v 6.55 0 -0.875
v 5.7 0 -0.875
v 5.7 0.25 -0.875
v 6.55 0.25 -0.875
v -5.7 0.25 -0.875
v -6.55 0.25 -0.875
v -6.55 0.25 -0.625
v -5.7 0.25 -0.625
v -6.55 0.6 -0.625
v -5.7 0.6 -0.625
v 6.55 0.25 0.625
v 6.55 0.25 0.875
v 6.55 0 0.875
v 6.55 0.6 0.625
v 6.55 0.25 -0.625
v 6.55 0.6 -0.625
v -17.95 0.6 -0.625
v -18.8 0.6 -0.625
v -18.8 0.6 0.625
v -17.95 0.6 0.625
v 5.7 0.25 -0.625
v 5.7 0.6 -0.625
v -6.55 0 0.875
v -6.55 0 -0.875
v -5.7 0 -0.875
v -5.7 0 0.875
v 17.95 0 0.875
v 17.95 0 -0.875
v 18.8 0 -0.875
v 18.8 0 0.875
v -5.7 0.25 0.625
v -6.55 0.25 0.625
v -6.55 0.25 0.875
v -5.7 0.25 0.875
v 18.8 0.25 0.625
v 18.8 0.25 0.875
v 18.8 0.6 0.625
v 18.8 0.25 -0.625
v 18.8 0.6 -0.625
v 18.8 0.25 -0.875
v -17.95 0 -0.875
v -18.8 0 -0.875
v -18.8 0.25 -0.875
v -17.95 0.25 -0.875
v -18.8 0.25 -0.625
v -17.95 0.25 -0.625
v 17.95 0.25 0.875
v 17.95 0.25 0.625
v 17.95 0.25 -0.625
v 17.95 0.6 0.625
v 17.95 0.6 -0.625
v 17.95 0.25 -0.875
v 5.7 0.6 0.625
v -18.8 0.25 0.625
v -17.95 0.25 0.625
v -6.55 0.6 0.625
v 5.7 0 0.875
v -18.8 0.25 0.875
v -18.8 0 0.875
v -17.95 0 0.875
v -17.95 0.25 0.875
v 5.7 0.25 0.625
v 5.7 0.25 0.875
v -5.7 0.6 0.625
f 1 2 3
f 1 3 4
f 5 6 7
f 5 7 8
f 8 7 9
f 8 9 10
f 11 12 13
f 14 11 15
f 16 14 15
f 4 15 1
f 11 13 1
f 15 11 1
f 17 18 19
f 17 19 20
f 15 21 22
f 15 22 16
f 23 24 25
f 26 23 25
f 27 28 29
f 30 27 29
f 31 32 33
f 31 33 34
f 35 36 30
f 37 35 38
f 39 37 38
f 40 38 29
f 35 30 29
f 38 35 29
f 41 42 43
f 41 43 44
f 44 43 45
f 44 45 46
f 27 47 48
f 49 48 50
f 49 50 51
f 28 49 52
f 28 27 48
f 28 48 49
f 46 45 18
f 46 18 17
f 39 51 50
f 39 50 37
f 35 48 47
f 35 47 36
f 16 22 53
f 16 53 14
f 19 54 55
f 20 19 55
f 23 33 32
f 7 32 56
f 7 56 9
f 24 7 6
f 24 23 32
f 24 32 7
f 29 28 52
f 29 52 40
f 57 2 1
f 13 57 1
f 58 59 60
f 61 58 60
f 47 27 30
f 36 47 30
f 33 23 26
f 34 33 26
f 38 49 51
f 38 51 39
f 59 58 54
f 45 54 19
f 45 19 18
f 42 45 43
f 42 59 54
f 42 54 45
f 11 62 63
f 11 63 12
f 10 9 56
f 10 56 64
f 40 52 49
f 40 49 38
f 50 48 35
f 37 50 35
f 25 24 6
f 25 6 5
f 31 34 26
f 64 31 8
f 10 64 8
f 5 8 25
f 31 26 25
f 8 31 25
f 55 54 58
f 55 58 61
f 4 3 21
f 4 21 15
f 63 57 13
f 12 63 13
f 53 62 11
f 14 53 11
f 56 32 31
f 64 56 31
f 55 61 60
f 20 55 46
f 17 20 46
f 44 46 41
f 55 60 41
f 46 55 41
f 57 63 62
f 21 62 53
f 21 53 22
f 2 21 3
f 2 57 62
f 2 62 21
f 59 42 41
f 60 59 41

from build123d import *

# Parameters (mm, degrees)
SKETCH1_W             = 0.85
SKETCH1_H             = 1.25
BOSS_EXTRUDE1_DEPTH   = 0.6
BOSS_EXTRUDE1_2_DEPTH = 0.6
BOSS_EXTRUDE1_3_DEPTH = 0.6
BOSS_EXTRUDE1_4_DEPTH = 0.6
SKETCH2_W             = 0.85
SKETCH2_H             = 0.25
BOSS_EXTRUDE2_DEPTH   = 0.25


with BuildPart() as part:
    # Sketch1 → Boss-Extrude1 (new body)
    with BuildSketch(Plane(origin=(0, 0, 0), x_dir=(1, 0, 0), z_dir=(0, 1, 0))):
        with Locations((-18.375, 0)):
            Rectangle(SKETCH1_W, SKETCH1_H)
    extrude(amount=BOSS_EXTRUDE1_DEPTH)



with BuildPart() as body_2:
    # Sketch1 → Boss-Extrude1 2 (new body)
    with BuildSketch(Plane(origin=(0, 0, 0), x_dir=(1, 0, 0), z_dir=(0, 1, 0))):
        with Locations((18.375, 0)):
            Rectangle(SKETCH1_W, SKETCH1_H)
    extrude(amount=BOSS_EXTRUDE1_2_DEPTH)


with BuildPart() as body_3:
    # Sketch1 → Boss-Extrude1 3 (new body)
    with BuildSketch(Plane(origin=(0, 0, 0), x_dir=(1, 0, 0), z_dir=(0, 1, 0))):
        with Locations((-6.125, 0)):
            Rectangle(SKETCH1_W, SKETCH1_H)
    extrude(amount=BOSS_EXTRUDE1_3_DEPTH)


with BuildPart() as body_4:
    # Sketch1 → Boss-Extrude1 4 (new body)
    with BuildSketch(Plane(origin=(0, 0, 0), x_dir=(1, 0, 0), z_dir=(0, 1, 0))):
        with Locations((6.125, 0)):
            Rectangle(SKETCH1_W, SKETCH1_H)
    extrude(amount=BOSS_EXTRUDE1_4_DEPTH)


with BuildPart() as part_1:
    add(part.part)

    add(body_2.part)  # Boss-Extrude2 merges body 2

    add(body_3.part)  # Boss-Extrude2 merges body 3

    add(body_4.part)  # Boss-Extrude2 merges body 4
    # Sketch2 → Boss-Extrude2 (add)
    with BuildSketch(Plane(origin=(0, 0, 0), x_dir=(1, 0, 0), z_dir=(0, 1, 0))):
        with Locations((-18.375, 0.75)):
            Rectangle(SKETCH2_W, SKETCH2_H)
        with Locations((-6.125, 0.75)):
            Rectangle(SKETCH2_W, SKETCH2_H)
        with Locations((6.125, 0.75)):
            Rectangle(SKETCH2_W, SKETCH2_H)
        with Locations((18.375, 0.75)):
            Rectangle(SKETCH2_W, SKETCH2_H)
        with Locations((18.375, -0.75)):
            Rectangle(SKETCH2_W, SKETCH2_H)
        with Locations((6.125, -0.75)):
            Rectangle(SKETCH2_W, SKETCH2_H)
        with Locations((-6.125, -0.75)):
            Rectangle(SKETCH2_W, SKETCH2_H)
        with Locations((-18.375, -0.75)):
            Rectangle(SKETCH2_W, SKETCH2_H)
    extrude(amount=BOSS_EXTRUDE2_DEPTH)


solid = part_1.part
